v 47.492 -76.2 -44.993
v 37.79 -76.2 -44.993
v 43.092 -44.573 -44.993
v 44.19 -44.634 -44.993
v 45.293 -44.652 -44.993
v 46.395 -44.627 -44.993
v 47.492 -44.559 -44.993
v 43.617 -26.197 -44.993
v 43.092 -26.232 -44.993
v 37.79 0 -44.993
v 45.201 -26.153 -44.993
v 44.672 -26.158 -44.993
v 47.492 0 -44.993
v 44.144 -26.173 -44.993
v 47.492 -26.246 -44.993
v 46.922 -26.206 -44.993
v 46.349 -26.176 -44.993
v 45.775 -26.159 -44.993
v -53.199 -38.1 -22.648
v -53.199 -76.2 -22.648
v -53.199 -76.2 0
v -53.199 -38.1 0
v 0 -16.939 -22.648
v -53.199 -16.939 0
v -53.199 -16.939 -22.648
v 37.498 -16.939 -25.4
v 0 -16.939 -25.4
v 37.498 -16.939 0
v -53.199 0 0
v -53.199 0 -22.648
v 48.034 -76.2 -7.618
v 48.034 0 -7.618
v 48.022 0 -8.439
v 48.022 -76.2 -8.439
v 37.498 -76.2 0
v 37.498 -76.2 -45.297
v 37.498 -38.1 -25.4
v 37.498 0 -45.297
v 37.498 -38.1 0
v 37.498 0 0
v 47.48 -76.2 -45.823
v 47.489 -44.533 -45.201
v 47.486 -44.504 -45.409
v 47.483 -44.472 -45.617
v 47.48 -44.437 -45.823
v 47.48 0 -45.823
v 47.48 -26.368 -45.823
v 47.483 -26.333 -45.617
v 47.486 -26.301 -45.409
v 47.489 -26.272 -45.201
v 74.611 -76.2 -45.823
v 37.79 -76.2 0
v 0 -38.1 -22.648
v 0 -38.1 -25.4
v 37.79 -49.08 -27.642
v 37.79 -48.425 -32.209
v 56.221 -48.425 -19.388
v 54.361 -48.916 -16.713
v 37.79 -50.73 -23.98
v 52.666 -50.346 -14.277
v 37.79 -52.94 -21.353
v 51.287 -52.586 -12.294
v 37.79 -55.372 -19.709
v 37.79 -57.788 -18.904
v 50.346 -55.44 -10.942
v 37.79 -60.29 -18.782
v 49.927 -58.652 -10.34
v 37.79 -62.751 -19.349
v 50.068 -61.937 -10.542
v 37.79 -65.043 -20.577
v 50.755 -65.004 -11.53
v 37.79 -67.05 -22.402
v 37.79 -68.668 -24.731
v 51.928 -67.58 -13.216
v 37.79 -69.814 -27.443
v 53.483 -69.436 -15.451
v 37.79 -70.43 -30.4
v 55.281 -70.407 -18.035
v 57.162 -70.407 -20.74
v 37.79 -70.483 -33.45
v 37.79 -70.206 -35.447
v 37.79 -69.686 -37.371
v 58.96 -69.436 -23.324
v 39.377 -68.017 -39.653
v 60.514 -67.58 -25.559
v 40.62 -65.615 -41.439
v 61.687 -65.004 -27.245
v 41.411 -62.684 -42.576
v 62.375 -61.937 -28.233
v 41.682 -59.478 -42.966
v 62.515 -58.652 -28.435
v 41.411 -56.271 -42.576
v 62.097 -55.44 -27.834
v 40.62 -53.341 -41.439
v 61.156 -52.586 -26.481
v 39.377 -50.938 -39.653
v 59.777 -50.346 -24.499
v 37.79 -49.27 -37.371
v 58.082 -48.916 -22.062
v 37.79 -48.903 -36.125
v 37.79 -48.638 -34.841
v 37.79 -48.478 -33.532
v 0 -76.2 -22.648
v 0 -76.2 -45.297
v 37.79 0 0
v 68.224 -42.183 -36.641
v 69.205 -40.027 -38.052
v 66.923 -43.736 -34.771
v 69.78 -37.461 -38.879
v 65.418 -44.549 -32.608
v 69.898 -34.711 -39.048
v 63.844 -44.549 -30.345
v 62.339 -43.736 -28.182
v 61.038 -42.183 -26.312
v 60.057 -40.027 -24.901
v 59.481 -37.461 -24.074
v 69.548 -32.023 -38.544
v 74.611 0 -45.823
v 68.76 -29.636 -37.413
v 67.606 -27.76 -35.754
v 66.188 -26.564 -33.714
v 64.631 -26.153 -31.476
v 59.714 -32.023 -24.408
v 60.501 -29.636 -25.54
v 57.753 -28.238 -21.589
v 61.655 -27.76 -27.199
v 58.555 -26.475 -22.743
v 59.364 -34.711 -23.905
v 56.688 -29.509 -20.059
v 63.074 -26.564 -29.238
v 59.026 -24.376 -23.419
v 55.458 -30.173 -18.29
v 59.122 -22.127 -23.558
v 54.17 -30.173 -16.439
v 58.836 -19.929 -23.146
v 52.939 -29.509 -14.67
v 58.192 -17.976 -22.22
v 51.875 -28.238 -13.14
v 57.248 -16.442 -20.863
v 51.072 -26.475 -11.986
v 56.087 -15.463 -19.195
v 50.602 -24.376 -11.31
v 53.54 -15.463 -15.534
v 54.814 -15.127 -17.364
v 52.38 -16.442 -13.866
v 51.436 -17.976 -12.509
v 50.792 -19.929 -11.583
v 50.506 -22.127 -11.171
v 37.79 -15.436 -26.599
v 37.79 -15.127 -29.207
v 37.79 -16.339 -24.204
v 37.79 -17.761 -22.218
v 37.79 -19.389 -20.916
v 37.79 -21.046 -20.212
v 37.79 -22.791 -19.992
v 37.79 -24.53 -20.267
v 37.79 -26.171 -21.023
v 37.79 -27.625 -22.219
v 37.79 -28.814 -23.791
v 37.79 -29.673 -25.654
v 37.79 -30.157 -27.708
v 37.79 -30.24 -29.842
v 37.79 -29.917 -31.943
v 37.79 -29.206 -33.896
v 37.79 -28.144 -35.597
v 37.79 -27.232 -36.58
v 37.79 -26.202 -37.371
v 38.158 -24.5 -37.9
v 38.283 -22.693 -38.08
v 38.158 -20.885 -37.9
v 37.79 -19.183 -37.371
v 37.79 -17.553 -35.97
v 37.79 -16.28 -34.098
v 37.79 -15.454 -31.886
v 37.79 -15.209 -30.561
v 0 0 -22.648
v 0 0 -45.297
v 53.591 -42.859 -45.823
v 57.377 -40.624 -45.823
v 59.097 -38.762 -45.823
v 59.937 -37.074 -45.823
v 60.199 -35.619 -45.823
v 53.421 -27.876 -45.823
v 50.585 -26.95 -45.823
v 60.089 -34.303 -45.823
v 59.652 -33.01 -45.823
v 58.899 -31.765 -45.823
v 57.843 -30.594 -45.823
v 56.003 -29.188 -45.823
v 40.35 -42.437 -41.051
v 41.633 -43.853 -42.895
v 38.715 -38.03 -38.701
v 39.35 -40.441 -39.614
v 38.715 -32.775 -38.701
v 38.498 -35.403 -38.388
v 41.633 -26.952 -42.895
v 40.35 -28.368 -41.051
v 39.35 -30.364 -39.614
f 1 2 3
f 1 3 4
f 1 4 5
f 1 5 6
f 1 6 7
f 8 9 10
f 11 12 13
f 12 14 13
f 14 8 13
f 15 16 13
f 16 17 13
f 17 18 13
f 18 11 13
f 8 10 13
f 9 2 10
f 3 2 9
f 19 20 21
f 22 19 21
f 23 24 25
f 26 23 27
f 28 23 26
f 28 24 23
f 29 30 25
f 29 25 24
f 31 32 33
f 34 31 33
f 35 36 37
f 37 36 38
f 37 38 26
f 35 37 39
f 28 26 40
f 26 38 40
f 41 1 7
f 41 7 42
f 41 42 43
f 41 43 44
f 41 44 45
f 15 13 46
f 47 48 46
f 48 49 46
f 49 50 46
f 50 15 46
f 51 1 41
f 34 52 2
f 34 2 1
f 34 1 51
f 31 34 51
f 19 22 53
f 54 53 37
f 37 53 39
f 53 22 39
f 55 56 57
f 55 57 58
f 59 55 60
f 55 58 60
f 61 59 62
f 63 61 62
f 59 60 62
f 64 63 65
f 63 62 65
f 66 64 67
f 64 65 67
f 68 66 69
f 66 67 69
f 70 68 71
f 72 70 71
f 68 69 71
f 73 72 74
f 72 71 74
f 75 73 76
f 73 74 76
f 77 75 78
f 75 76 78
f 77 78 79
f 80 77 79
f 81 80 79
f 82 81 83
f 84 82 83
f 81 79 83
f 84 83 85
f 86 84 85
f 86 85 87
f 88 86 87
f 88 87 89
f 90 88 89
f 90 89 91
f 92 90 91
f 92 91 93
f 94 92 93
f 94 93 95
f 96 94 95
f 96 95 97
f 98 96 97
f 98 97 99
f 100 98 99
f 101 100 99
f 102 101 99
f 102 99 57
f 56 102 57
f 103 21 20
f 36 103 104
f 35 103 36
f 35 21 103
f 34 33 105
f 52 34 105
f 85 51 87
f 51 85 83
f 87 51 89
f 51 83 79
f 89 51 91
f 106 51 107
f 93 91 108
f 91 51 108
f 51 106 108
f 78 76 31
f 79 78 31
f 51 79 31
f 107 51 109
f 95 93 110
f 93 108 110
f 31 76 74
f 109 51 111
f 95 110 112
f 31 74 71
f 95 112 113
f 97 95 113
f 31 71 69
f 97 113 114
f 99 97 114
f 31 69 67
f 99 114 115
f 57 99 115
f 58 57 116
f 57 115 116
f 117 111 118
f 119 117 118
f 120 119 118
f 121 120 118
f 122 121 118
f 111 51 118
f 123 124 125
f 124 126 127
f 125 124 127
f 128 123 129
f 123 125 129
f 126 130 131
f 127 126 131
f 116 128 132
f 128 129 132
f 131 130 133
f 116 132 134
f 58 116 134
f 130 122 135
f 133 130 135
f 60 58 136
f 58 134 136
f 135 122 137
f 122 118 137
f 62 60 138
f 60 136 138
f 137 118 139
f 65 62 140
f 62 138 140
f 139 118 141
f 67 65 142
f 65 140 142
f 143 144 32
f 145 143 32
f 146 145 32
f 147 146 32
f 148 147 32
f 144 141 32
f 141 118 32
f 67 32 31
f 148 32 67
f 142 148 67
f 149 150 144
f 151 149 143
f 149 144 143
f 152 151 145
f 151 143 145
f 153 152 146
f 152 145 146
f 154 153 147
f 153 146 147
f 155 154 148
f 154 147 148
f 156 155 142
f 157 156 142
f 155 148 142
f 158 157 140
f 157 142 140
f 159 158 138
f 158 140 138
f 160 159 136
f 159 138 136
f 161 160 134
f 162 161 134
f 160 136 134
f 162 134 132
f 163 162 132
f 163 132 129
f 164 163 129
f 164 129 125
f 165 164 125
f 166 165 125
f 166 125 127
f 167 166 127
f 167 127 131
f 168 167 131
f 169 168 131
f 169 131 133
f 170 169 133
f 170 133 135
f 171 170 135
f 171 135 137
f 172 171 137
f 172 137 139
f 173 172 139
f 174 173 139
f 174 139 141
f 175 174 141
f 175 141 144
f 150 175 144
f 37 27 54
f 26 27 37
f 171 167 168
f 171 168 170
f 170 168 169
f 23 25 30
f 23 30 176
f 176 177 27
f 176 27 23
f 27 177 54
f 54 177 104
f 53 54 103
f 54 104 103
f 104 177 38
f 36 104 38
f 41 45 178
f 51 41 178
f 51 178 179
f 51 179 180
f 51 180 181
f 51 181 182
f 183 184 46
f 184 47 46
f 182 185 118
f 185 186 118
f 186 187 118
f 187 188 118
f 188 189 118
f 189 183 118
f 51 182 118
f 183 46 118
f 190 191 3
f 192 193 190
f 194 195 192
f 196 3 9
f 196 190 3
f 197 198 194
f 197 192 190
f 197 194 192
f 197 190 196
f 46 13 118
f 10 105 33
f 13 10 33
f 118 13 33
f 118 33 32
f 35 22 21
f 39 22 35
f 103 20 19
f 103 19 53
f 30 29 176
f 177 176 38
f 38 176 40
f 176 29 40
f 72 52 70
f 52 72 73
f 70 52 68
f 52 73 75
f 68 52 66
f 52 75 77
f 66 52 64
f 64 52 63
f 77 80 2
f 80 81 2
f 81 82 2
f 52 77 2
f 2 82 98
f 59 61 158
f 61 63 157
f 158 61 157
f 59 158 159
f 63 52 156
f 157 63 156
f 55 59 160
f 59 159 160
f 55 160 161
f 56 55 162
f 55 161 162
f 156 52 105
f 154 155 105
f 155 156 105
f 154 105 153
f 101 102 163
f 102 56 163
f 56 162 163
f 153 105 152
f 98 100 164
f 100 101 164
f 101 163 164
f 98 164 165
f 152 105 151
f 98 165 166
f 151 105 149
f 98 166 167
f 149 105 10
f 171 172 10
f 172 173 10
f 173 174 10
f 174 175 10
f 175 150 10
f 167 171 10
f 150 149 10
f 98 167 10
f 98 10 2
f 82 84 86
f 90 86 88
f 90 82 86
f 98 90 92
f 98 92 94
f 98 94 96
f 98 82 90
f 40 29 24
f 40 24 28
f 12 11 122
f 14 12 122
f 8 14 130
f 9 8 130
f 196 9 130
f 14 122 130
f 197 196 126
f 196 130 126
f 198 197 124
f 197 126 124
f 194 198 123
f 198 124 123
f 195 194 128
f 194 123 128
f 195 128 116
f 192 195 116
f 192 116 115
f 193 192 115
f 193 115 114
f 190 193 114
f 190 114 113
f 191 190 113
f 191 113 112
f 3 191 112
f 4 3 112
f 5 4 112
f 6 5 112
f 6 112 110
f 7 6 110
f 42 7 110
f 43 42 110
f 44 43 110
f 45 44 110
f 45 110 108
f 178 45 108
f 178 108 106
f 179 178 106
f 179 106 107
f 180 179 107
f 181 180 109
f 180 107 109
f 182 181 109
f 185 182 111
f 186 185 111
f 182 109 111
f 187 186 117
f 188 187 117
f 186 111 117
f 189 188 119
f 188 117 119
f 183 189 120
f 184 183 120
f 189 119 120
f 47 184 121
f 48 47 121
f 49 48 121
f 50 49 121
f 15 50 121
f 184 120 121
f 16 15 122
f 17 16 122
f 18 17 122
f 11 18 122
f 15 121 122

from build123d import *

# Parameters (mm, degrees)
F0_W      = 90.6968638301
F0_H      = 45.2968254685
F1_DEPTH  = 76.2
F2_W      = 90.6968638301
F2_H      = 21.1606169999
F3_DEPTH  = 25.4
F5_DEPTH  = 76.2
F7_DEPTH  = 76.2
F8_W      = 53.1990528107
F8_H      = 22.6484127343
F9_DEPTH  = 76.2
F10_R     = 11.0525530921
F11_DEPTH = 25.4
F12_R     = 7.5654694939
F13_DEPTH = 25.4
F14_R     = 9.2493841875
F15_DEPTH = 25.4


with BuildPart() as f1:
    # F0 (on Front) → F1 (new body)
    with BuildSketch(Plane.XZ):
        with Locations((-7.8506208956, -22.6484127343)):
            Rectangle(F0_W, F0_H)
    extrude(amount=F1_DEPTH)

    # F2 (on face) → F3 (cut)
    with BuildSketch(Plane.XY):
        with Locations((-7.8506208956, -27.5196915001)):
            Rectangle(F2_W, F2_H)
    extrude(amount=-F3_DEPTH, mode=Mode.SUBTRACT)

    # F8 (on face) → F9 (cut)
    with BuildSketch(Plane.XZ.offset(76.2)):
        with Locations((-26.5995264053, -33.9726191014)):
            Rectangle(F8_W, F8_H)
    extrude(amount=-F9_DEPTH, mode=Mode.SUBTRACT)


with BuildPart() as f5:
    # F4 (on Front) → F5 (new body)
    with BuildSketch(Plane.XZ):
        Polygon((37.7901904285, 0), (37.7901904285, -44.9928082526), (48.0336844921, -44.9928082526), (48.0336844921, -8.4484461695), align=None)
    extrude(amount=F5_DEPTH)

    # F6 (on Front) → F7 (join)
    with BuildSketch(Plane.XZ):
        Polygon((74.611403048, -45.8233617246), (48.0336844921, -7.6178922318), (47.4799796939, -45.8233617246), align=None)
    extrude(amount=F7_DEPTH)

    # F10 (on face) → F11 (cut)
    with BuildSketch(Plane(origin=(28.7980055124, 0, 20.0333956274), x_dir=(0, 1, 0), z_dir=(0.8209051953, 0, 0.5710644976))):
        with Locations((-59.4775974751, -48.0213984847)):
            Circle(F10_R)
    extrude(amount=-F11_DEPTH, mode=Mode.SUBTRACT)

    # F12 (on face) → F13 (cut)
    with BuildSketch(Plane(origin=(28.7980055124, 0, 20.0333956274), x_dir=(0, 1, 0), z_dir=(0.8209051953, 0, 0.5710644976))):
        with Locations((-22.6925052702, -45.5568544567)):
            Circle(F12_R)
    extrude(amount=-F13_DEPTH, mode=Mode.SUBTRACT)

    # F14 (on face) → F15 (cut)
    with BuildSketch(Plane(origin=(28.7980055124, 0, 20.0333956274), x_dir=(0, 1, 0), z_dir=(0.8209051953, 0, 0.5710644976))):
        with Locations((-35.4025401175, -62.7474635839)):
            Circle(F14_R)
    extrude(amount=-F15_DEPTH, mode=Mode.SUBTRACT)


solid = Compound([f1.part, f5.part])
